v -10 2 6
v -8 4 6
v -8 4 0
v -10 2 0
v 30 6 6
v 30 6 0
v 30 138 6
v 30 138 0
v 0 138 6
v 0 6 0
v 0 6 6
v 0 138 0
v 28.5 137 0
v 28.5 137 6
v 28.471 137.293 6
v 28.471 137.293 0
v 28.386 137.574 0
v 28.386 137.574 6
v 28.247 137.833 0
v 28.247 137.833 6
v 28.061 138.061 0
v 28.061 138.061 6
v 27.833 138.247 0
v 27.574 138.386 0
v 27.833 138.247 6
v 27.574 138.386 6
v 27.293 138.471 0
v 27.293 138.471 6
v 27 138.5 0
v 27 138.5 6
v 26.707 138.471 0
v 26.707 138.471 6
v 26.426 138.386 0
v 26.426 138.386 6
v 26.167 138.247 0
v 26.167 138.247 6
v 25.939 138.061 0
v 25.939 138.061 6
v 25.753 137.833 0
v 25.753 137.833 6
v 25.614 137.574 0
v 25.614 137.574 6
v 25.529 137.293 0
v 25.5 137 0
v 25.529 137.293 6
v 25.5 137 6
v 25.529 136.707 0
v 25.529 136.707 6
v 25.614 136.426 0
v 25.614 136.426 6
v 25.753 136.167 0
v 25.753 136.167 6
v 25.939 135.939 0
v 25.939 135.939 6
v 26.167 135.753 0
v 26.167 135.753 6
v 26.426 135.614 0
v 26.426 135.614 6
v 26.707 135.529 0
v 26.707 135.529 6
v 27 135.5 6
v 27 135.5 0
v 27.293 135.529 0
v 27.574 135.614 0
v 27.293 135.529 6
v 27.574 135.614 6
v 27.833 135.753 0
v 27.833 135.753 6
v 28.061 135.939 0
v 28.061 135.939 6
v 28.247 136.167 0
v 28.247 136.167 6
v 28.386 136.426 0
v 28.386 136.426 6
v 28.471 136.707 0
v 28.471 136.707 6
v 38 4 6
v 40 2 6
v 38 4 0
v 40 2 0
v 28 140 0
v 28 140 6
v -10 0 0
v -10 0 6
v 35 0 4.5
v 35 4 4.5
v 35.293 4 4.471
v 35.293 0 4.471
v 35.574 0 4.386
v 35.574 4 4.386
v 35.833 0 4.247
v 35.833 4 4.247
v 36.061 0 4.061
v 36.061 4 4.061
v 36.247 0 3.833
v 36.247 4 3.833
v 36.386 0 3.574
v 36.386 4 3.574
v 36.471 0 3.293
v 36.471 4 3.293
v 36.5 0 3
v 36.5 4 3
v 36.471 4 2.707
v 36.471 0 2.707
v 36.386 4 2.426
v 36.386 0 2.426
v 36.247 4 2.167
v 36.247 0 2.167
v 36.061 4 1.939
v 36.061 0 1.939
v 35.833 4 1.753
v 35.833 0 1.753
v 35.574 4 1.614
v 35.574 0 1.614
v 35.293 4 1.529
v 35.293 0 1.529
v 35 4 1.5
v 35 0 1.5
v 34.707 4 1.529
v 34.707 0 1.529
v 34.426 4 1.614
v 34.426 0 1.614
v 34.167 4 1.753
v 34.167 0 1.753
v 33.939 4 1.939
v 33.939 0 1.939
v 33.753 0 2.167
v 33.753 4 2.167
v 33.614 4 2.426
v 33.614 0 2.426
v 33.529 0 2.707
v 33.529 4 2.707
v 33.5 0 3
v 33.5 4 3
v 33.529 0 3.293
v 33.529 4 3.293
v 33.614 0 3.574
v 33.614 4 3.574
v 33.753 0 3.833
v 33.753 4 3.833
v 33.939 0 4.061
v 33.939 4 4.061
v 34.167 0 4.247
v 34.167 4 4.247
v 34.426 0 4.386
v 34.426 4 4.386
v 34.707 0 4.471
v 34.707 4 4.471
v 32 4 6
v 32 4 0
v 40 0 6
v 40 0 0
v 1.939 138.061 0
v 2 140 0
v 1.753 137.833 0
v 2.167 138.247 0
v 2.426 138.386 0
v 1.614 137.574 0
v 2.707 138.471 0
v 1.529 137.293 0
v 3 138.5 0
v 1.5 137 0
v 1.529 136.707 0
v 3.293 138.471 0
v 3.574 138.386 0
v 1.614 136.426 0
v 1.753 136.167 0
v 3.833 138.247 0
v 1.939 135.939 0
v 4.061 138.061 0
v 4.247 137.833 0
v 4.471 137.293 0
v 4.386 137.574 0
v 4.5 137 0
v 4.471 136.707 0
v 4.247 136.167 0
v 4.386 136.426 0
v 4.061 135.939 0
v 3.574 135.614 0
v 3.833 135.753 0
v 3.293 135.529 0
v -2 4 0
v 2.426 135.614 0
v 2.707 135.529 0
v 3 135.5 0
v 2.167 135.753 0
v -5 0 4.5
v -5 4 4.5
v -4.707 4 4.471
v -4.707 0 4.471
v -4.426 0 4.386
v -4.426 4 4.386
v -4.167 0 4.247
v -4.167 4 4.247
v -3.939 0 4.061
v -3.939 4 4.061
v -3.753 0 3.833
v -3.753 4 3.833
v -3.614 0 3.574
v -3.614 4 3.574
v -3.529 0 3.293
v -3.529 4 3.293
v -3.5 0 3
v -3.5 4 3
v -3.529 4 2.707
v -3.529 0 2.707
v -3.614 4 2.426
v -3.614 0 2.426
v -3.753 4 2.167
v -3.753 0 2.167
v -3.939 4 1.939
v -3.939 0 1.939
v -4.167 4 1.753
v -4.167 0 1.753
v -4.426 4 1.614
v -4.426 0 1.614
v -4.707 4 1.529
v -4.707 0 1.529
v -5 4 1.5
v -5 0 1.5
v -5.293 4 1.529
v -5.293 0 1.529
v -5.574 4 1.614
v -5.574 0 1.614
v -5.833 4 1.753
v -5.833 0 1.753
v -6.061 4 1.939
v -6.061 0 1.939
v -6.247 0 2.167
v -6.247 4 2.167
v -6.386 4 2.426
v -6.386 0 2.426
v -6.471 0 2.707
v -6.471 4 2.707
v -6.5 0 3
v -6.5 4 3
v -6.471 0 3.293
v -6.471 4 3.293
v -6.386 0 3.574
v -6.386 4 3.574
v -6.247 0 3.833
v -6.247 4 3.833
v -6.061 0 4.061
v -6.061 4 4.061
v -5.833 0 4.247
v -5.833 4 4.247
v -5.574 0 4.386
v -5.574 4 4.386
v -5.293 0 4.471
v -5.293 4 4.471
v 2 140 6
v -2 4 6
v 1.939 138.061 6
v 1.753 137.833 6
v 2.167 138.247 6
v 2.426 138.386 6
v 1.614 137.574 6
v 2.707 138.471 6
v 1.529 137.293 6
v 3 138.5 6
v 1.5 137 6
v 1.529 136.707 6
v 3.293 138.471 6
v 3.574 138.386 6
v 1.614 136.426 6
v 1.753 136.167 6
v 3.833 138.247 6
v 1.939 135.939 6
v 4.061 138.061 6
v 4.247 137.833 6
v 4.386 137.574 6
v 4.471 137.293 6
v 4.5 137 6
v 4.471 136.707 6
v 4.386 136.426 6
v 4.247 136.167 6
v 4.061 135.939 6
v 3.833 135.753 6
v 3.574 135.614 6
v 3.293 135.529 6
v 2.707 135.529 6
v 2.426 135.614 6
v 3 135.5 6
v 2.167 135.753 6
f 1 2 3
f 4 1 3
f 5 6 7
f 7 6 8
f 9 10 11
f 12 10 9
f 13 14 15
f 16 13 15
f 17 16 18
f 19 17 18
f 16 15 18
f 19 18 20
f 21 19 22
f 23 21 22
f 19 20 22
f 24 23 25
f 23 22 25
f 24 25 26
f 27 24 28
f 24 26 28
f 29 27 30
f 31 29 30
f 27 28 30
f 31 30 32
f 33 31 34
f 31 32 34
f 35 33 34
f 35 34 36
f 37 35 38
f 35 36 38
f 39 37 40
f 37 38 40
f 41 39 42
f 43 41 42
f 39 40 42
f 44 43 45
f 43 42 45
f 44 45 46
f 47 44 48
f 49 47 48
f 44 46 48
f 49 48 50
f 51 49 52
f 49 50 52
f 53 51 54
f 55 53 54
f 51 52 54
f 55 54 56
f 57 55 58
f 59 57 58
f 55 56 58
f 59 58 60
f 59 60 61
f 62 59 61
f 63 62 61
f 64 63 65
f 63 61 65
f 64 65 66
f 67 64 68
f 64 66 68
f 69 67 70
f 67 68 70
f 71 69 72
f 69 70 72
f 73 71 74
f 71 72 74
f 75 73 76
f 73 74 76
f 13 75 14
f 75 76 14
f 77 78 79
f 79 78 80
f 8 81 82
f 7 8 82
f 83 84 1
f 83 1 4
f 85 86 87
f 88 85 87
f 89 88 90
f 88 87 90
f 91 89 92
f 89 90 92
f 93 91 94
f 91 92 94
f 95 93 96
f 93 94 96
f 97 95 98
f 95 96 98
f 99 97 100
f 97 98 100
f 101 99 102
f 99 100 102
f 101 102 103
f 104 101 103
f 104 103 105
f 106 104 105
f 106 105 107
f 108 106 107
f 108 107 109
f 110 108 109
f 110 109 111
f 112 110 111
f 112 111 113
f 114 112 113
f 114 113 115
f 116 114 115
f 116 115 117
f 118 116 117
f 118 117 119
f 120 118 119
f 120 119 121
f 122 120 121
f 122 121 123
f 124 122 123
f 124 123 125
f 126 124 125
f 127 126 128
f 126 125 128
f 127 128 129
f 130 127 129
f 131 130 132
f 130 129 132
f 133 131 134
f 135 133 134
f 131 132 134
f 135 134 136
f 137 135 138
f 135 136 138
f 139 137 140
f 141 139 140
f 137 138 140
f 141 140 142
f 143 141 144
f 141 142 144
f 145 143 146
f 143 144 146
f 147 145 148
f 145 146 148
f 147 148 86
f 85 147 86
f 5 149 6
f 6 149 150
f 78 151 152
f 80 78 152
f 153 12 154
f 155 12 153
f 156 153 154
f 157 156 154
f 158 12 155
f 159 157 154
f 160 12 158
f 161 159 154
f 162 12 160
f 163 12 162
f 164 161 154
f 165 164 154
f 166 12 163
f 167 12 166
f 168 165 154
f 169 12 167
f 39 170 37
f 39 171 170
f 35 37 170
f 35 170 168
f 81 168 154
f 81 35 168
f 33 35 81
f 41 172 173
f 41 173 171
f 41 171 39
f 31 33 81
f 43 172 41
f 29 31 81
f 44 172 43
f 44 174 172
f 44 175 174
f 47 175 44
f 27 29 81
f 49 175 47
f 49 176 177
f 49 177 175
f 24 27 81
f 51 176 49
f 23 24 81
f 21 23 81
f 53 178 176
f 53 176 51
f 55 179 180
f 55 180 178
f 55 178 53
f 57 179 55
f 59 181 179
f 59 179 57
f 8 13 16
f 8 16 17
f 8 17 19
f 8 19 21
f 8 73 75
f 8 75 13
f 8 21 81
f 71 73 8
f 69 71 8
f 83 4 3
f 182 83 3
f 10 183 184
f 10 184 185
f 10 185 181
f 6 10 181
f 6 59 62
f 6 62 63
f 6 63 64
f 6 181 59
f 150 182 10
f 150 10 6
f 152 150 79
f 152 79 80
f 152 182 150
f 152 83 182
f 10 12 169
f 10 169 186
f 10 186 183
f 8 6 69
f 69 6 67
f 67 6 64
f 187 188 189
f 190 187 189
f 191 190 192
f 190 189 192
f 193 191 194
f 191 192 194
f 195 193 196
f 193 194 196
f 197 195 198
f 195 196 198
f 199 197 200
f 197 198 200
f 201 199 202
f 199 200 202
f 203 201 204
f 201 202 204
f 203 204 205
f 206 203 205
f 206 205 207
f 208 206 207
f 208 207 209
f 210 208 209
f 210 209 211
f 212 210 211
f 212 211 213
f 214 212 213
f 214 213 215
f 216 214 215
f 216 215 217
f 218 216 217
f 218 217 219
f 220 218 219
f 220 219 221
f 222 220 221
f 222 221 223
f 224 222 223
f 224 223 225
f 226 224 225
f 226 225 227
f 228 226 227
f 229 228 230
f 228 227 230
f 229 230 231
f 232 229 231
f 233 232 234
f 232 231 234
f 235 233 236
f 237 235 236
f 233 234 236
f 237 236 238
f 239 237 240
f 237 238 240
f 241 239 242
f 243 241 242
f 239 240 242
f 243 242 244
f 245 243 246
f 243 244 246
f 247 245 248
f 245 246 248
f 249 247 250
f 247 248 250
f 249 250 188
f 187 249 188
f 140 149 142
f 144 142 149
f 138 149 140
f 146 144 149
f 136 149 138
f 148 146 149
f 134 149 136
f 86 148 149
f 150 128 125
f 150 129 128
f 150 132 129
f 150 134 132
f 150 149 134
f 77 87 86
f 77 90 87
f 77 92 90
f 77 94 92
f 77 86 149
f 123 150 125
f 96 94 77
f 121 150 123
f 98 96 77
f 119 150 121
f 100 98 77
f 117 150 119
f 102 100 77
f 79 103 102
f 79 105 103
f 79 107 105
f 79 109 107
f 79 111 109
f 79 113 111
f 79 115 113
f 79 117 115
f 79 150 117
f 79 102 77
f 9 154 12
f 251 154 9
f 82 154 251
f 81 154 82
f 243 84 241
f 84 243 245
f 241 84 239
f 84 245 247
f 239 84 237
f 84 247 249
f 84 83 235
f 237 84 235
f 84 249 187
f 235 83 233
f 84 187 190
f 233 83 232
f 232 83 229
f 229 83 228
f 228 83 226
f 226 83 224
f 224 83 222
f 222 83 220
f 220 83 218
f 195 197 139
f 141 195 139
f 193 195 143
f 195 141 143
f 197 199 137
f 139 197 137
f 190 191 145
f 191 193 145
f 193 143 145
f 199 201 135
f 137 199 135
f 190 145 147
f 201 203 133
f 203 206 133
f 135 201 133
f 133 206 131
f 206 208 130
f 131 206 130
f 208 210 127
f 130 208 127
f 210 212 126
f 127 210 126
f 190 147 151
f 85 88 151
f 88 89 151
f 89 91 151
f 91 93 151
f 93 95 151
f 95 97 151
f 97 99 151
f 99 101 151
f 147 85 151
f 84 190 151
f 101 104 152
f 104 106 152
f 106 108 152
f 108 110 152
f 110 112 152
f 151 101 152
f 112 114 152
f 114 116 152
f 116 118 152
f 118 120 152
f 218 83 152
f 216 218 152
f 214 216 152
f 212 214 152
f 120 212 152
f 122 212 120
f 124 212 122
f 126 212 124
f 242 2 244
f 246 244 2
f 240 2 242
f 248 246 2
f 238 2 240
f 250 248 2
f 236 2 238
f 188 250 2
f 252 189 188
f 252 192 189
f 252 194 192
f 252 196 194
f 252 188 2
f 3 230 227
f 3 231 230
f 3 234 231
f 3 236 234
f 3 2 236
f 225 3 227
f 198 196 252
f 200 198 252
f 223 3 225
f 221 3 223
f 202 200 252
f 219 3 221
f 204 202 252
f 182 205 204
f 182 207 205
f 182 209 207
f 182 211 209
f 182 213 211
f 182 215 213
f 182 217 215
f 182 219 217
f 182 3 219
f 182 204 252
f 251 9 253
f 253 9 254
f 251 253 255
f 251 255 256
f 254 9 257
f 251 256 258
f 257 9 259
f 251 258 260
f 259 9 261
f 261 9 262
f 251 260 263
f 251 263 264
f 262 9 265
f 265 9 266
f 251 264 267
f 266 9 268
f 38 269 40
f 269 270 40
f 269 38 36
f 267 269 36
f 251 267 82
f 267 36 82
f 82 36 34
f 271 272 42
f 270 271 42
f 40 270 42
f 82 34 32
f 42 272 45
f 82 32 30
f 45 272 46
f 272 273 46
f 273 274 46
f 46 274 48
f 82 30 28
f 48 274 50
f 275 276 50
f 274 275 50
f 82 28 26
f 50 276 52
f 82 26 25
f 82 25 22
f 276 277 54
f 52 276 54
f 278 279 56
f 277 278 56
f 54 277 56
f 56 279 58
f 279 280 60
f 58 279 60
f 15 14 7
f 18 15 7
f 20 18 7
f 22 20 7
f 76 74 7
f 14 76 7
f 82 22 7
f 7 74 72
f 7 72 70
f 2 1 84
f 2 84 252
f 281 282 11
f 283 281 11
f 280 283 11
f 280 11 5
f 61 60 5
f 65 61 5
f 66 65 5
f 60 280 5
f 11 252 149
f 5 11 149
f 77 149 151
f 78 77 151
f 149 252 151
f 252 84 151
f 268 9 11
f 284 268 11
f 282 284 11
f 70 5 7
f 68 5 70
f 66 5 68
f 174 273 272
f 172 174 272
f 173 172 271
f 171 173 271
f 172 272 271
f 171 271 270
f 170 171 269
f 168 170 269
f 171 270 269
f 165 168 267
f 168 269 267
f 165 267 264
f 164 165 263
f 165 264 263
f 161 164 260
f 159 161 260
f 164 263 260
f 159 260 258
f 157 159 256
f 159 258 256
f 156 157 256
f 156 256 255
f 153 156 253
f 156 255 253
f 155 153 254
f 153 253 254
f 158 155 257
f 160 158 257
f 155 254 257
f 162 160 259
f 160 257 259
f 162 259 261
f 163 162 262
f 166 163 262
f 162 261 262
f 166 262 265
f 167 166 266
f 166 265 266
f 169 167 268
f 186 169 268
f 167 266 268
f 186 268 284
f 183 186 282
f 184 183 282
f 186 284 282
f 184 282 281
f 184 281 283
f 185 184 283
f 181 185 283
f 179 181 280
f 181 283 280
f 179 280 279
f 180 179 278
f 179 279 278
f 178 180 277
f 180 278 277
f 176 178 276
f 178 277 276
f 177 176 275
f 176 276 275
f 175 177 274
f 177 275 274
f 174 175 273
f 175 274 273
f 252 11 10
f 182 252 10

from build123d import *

# Parameters (mm, degrees)
SKETCH1_W           = 30
SKETCH1_H           = 140
BOSS_EXTRUDE1_DEPTH = 6
CHAMFER1_SIZE       = 2
SKETCH2_R           = 1.5
CUT_EXTRUDE1_DEPTH  = 6
SKETCH3_W           = 10
SKETCH3_H           = 6
BOSS_EXTRUDE2_DEPTH = 4
CHAMFER2_SIZE       = 2
SKETCH4_R           = 1.5
CUT_EXTRUDE2_DEPTH  = 142.887279204


with BuildPart() as part:
    # Sketch1 → Boss-Extrude1 (new body)
    with BuildSketch(Plane.XY):
        with Locations((15, 70)):
            Rectangle(SKETCH1_W, SKETCH1_H)
    extrude(amount=BOSS_EXTRUDE1_DEPTH)

    # Chamfer1
    chamfer1_edges = [part.edges().sort_by_distance(p)[0] for p in [
        (0, 140, 3),
        (30, 140, 3),
    ]]
    chamfer(chamfer1_edges, length=CHAMFER1_SIZE)

    # Sketch2 → Cut-Extrude1 (cut)
    with BuildSketch(Plane.XY.offset(6)):
        with Locations((3, 137)):
            Circle(SKETCH2_R)
        with Locations((27, 137)):
            Circle(SKETCH2_R)
    extrude(amount=-CUT_EXTRUDE1_DEPTH, mode=Mode.SUBTRACT)

    # Sketch3 → Boss-Extrude2 (add)
    with BuildSketch(Plane(origin=(0, 0, 0), x_dir=(1, 0, 0), z_dir=(0, 1, 0))):
        with Locations((-5, -3)):
            Rectangle(SKETCH3_W, SKETCH3_H)
        with Locations((35, -3)):
            Rectangle(SKETCH3_W, SKETCH3_H)
    extrude(amount=BOSS_EXTRUDE2_DEPTH)

    # Chamfer2
    chamfer2_edges = [part.edges().sort_by_distance(p)[0] for p in [
        (0, 4, 3),
        (-10, 4, 3),
        (30, 4, 3),
        (40, 4, 3),
    ]]
    chamfer(chamfer2_edges, length=CHAMFER2_SIZE)

    # Sketch4 → Cut-Extrude2 (cut, through all)
    with BuildSketch(Plane(origin=(0, 4, 0), x_dir=(1, 0, 0), z_dir=(0, 1, 0))):
        with Locations(Location((-5, -3, 0), (0, 0, 270))):
            Circle(SKETCH4_R)
        with Locations(Location((35, -3, 0), (0, 0, 270))):
            Circle(SKETCH4_R)
    extrude(amount=-CUT_EXTRUDE2_DEPTH, mode=Mode.SUBTRACT)


solid = part.part
